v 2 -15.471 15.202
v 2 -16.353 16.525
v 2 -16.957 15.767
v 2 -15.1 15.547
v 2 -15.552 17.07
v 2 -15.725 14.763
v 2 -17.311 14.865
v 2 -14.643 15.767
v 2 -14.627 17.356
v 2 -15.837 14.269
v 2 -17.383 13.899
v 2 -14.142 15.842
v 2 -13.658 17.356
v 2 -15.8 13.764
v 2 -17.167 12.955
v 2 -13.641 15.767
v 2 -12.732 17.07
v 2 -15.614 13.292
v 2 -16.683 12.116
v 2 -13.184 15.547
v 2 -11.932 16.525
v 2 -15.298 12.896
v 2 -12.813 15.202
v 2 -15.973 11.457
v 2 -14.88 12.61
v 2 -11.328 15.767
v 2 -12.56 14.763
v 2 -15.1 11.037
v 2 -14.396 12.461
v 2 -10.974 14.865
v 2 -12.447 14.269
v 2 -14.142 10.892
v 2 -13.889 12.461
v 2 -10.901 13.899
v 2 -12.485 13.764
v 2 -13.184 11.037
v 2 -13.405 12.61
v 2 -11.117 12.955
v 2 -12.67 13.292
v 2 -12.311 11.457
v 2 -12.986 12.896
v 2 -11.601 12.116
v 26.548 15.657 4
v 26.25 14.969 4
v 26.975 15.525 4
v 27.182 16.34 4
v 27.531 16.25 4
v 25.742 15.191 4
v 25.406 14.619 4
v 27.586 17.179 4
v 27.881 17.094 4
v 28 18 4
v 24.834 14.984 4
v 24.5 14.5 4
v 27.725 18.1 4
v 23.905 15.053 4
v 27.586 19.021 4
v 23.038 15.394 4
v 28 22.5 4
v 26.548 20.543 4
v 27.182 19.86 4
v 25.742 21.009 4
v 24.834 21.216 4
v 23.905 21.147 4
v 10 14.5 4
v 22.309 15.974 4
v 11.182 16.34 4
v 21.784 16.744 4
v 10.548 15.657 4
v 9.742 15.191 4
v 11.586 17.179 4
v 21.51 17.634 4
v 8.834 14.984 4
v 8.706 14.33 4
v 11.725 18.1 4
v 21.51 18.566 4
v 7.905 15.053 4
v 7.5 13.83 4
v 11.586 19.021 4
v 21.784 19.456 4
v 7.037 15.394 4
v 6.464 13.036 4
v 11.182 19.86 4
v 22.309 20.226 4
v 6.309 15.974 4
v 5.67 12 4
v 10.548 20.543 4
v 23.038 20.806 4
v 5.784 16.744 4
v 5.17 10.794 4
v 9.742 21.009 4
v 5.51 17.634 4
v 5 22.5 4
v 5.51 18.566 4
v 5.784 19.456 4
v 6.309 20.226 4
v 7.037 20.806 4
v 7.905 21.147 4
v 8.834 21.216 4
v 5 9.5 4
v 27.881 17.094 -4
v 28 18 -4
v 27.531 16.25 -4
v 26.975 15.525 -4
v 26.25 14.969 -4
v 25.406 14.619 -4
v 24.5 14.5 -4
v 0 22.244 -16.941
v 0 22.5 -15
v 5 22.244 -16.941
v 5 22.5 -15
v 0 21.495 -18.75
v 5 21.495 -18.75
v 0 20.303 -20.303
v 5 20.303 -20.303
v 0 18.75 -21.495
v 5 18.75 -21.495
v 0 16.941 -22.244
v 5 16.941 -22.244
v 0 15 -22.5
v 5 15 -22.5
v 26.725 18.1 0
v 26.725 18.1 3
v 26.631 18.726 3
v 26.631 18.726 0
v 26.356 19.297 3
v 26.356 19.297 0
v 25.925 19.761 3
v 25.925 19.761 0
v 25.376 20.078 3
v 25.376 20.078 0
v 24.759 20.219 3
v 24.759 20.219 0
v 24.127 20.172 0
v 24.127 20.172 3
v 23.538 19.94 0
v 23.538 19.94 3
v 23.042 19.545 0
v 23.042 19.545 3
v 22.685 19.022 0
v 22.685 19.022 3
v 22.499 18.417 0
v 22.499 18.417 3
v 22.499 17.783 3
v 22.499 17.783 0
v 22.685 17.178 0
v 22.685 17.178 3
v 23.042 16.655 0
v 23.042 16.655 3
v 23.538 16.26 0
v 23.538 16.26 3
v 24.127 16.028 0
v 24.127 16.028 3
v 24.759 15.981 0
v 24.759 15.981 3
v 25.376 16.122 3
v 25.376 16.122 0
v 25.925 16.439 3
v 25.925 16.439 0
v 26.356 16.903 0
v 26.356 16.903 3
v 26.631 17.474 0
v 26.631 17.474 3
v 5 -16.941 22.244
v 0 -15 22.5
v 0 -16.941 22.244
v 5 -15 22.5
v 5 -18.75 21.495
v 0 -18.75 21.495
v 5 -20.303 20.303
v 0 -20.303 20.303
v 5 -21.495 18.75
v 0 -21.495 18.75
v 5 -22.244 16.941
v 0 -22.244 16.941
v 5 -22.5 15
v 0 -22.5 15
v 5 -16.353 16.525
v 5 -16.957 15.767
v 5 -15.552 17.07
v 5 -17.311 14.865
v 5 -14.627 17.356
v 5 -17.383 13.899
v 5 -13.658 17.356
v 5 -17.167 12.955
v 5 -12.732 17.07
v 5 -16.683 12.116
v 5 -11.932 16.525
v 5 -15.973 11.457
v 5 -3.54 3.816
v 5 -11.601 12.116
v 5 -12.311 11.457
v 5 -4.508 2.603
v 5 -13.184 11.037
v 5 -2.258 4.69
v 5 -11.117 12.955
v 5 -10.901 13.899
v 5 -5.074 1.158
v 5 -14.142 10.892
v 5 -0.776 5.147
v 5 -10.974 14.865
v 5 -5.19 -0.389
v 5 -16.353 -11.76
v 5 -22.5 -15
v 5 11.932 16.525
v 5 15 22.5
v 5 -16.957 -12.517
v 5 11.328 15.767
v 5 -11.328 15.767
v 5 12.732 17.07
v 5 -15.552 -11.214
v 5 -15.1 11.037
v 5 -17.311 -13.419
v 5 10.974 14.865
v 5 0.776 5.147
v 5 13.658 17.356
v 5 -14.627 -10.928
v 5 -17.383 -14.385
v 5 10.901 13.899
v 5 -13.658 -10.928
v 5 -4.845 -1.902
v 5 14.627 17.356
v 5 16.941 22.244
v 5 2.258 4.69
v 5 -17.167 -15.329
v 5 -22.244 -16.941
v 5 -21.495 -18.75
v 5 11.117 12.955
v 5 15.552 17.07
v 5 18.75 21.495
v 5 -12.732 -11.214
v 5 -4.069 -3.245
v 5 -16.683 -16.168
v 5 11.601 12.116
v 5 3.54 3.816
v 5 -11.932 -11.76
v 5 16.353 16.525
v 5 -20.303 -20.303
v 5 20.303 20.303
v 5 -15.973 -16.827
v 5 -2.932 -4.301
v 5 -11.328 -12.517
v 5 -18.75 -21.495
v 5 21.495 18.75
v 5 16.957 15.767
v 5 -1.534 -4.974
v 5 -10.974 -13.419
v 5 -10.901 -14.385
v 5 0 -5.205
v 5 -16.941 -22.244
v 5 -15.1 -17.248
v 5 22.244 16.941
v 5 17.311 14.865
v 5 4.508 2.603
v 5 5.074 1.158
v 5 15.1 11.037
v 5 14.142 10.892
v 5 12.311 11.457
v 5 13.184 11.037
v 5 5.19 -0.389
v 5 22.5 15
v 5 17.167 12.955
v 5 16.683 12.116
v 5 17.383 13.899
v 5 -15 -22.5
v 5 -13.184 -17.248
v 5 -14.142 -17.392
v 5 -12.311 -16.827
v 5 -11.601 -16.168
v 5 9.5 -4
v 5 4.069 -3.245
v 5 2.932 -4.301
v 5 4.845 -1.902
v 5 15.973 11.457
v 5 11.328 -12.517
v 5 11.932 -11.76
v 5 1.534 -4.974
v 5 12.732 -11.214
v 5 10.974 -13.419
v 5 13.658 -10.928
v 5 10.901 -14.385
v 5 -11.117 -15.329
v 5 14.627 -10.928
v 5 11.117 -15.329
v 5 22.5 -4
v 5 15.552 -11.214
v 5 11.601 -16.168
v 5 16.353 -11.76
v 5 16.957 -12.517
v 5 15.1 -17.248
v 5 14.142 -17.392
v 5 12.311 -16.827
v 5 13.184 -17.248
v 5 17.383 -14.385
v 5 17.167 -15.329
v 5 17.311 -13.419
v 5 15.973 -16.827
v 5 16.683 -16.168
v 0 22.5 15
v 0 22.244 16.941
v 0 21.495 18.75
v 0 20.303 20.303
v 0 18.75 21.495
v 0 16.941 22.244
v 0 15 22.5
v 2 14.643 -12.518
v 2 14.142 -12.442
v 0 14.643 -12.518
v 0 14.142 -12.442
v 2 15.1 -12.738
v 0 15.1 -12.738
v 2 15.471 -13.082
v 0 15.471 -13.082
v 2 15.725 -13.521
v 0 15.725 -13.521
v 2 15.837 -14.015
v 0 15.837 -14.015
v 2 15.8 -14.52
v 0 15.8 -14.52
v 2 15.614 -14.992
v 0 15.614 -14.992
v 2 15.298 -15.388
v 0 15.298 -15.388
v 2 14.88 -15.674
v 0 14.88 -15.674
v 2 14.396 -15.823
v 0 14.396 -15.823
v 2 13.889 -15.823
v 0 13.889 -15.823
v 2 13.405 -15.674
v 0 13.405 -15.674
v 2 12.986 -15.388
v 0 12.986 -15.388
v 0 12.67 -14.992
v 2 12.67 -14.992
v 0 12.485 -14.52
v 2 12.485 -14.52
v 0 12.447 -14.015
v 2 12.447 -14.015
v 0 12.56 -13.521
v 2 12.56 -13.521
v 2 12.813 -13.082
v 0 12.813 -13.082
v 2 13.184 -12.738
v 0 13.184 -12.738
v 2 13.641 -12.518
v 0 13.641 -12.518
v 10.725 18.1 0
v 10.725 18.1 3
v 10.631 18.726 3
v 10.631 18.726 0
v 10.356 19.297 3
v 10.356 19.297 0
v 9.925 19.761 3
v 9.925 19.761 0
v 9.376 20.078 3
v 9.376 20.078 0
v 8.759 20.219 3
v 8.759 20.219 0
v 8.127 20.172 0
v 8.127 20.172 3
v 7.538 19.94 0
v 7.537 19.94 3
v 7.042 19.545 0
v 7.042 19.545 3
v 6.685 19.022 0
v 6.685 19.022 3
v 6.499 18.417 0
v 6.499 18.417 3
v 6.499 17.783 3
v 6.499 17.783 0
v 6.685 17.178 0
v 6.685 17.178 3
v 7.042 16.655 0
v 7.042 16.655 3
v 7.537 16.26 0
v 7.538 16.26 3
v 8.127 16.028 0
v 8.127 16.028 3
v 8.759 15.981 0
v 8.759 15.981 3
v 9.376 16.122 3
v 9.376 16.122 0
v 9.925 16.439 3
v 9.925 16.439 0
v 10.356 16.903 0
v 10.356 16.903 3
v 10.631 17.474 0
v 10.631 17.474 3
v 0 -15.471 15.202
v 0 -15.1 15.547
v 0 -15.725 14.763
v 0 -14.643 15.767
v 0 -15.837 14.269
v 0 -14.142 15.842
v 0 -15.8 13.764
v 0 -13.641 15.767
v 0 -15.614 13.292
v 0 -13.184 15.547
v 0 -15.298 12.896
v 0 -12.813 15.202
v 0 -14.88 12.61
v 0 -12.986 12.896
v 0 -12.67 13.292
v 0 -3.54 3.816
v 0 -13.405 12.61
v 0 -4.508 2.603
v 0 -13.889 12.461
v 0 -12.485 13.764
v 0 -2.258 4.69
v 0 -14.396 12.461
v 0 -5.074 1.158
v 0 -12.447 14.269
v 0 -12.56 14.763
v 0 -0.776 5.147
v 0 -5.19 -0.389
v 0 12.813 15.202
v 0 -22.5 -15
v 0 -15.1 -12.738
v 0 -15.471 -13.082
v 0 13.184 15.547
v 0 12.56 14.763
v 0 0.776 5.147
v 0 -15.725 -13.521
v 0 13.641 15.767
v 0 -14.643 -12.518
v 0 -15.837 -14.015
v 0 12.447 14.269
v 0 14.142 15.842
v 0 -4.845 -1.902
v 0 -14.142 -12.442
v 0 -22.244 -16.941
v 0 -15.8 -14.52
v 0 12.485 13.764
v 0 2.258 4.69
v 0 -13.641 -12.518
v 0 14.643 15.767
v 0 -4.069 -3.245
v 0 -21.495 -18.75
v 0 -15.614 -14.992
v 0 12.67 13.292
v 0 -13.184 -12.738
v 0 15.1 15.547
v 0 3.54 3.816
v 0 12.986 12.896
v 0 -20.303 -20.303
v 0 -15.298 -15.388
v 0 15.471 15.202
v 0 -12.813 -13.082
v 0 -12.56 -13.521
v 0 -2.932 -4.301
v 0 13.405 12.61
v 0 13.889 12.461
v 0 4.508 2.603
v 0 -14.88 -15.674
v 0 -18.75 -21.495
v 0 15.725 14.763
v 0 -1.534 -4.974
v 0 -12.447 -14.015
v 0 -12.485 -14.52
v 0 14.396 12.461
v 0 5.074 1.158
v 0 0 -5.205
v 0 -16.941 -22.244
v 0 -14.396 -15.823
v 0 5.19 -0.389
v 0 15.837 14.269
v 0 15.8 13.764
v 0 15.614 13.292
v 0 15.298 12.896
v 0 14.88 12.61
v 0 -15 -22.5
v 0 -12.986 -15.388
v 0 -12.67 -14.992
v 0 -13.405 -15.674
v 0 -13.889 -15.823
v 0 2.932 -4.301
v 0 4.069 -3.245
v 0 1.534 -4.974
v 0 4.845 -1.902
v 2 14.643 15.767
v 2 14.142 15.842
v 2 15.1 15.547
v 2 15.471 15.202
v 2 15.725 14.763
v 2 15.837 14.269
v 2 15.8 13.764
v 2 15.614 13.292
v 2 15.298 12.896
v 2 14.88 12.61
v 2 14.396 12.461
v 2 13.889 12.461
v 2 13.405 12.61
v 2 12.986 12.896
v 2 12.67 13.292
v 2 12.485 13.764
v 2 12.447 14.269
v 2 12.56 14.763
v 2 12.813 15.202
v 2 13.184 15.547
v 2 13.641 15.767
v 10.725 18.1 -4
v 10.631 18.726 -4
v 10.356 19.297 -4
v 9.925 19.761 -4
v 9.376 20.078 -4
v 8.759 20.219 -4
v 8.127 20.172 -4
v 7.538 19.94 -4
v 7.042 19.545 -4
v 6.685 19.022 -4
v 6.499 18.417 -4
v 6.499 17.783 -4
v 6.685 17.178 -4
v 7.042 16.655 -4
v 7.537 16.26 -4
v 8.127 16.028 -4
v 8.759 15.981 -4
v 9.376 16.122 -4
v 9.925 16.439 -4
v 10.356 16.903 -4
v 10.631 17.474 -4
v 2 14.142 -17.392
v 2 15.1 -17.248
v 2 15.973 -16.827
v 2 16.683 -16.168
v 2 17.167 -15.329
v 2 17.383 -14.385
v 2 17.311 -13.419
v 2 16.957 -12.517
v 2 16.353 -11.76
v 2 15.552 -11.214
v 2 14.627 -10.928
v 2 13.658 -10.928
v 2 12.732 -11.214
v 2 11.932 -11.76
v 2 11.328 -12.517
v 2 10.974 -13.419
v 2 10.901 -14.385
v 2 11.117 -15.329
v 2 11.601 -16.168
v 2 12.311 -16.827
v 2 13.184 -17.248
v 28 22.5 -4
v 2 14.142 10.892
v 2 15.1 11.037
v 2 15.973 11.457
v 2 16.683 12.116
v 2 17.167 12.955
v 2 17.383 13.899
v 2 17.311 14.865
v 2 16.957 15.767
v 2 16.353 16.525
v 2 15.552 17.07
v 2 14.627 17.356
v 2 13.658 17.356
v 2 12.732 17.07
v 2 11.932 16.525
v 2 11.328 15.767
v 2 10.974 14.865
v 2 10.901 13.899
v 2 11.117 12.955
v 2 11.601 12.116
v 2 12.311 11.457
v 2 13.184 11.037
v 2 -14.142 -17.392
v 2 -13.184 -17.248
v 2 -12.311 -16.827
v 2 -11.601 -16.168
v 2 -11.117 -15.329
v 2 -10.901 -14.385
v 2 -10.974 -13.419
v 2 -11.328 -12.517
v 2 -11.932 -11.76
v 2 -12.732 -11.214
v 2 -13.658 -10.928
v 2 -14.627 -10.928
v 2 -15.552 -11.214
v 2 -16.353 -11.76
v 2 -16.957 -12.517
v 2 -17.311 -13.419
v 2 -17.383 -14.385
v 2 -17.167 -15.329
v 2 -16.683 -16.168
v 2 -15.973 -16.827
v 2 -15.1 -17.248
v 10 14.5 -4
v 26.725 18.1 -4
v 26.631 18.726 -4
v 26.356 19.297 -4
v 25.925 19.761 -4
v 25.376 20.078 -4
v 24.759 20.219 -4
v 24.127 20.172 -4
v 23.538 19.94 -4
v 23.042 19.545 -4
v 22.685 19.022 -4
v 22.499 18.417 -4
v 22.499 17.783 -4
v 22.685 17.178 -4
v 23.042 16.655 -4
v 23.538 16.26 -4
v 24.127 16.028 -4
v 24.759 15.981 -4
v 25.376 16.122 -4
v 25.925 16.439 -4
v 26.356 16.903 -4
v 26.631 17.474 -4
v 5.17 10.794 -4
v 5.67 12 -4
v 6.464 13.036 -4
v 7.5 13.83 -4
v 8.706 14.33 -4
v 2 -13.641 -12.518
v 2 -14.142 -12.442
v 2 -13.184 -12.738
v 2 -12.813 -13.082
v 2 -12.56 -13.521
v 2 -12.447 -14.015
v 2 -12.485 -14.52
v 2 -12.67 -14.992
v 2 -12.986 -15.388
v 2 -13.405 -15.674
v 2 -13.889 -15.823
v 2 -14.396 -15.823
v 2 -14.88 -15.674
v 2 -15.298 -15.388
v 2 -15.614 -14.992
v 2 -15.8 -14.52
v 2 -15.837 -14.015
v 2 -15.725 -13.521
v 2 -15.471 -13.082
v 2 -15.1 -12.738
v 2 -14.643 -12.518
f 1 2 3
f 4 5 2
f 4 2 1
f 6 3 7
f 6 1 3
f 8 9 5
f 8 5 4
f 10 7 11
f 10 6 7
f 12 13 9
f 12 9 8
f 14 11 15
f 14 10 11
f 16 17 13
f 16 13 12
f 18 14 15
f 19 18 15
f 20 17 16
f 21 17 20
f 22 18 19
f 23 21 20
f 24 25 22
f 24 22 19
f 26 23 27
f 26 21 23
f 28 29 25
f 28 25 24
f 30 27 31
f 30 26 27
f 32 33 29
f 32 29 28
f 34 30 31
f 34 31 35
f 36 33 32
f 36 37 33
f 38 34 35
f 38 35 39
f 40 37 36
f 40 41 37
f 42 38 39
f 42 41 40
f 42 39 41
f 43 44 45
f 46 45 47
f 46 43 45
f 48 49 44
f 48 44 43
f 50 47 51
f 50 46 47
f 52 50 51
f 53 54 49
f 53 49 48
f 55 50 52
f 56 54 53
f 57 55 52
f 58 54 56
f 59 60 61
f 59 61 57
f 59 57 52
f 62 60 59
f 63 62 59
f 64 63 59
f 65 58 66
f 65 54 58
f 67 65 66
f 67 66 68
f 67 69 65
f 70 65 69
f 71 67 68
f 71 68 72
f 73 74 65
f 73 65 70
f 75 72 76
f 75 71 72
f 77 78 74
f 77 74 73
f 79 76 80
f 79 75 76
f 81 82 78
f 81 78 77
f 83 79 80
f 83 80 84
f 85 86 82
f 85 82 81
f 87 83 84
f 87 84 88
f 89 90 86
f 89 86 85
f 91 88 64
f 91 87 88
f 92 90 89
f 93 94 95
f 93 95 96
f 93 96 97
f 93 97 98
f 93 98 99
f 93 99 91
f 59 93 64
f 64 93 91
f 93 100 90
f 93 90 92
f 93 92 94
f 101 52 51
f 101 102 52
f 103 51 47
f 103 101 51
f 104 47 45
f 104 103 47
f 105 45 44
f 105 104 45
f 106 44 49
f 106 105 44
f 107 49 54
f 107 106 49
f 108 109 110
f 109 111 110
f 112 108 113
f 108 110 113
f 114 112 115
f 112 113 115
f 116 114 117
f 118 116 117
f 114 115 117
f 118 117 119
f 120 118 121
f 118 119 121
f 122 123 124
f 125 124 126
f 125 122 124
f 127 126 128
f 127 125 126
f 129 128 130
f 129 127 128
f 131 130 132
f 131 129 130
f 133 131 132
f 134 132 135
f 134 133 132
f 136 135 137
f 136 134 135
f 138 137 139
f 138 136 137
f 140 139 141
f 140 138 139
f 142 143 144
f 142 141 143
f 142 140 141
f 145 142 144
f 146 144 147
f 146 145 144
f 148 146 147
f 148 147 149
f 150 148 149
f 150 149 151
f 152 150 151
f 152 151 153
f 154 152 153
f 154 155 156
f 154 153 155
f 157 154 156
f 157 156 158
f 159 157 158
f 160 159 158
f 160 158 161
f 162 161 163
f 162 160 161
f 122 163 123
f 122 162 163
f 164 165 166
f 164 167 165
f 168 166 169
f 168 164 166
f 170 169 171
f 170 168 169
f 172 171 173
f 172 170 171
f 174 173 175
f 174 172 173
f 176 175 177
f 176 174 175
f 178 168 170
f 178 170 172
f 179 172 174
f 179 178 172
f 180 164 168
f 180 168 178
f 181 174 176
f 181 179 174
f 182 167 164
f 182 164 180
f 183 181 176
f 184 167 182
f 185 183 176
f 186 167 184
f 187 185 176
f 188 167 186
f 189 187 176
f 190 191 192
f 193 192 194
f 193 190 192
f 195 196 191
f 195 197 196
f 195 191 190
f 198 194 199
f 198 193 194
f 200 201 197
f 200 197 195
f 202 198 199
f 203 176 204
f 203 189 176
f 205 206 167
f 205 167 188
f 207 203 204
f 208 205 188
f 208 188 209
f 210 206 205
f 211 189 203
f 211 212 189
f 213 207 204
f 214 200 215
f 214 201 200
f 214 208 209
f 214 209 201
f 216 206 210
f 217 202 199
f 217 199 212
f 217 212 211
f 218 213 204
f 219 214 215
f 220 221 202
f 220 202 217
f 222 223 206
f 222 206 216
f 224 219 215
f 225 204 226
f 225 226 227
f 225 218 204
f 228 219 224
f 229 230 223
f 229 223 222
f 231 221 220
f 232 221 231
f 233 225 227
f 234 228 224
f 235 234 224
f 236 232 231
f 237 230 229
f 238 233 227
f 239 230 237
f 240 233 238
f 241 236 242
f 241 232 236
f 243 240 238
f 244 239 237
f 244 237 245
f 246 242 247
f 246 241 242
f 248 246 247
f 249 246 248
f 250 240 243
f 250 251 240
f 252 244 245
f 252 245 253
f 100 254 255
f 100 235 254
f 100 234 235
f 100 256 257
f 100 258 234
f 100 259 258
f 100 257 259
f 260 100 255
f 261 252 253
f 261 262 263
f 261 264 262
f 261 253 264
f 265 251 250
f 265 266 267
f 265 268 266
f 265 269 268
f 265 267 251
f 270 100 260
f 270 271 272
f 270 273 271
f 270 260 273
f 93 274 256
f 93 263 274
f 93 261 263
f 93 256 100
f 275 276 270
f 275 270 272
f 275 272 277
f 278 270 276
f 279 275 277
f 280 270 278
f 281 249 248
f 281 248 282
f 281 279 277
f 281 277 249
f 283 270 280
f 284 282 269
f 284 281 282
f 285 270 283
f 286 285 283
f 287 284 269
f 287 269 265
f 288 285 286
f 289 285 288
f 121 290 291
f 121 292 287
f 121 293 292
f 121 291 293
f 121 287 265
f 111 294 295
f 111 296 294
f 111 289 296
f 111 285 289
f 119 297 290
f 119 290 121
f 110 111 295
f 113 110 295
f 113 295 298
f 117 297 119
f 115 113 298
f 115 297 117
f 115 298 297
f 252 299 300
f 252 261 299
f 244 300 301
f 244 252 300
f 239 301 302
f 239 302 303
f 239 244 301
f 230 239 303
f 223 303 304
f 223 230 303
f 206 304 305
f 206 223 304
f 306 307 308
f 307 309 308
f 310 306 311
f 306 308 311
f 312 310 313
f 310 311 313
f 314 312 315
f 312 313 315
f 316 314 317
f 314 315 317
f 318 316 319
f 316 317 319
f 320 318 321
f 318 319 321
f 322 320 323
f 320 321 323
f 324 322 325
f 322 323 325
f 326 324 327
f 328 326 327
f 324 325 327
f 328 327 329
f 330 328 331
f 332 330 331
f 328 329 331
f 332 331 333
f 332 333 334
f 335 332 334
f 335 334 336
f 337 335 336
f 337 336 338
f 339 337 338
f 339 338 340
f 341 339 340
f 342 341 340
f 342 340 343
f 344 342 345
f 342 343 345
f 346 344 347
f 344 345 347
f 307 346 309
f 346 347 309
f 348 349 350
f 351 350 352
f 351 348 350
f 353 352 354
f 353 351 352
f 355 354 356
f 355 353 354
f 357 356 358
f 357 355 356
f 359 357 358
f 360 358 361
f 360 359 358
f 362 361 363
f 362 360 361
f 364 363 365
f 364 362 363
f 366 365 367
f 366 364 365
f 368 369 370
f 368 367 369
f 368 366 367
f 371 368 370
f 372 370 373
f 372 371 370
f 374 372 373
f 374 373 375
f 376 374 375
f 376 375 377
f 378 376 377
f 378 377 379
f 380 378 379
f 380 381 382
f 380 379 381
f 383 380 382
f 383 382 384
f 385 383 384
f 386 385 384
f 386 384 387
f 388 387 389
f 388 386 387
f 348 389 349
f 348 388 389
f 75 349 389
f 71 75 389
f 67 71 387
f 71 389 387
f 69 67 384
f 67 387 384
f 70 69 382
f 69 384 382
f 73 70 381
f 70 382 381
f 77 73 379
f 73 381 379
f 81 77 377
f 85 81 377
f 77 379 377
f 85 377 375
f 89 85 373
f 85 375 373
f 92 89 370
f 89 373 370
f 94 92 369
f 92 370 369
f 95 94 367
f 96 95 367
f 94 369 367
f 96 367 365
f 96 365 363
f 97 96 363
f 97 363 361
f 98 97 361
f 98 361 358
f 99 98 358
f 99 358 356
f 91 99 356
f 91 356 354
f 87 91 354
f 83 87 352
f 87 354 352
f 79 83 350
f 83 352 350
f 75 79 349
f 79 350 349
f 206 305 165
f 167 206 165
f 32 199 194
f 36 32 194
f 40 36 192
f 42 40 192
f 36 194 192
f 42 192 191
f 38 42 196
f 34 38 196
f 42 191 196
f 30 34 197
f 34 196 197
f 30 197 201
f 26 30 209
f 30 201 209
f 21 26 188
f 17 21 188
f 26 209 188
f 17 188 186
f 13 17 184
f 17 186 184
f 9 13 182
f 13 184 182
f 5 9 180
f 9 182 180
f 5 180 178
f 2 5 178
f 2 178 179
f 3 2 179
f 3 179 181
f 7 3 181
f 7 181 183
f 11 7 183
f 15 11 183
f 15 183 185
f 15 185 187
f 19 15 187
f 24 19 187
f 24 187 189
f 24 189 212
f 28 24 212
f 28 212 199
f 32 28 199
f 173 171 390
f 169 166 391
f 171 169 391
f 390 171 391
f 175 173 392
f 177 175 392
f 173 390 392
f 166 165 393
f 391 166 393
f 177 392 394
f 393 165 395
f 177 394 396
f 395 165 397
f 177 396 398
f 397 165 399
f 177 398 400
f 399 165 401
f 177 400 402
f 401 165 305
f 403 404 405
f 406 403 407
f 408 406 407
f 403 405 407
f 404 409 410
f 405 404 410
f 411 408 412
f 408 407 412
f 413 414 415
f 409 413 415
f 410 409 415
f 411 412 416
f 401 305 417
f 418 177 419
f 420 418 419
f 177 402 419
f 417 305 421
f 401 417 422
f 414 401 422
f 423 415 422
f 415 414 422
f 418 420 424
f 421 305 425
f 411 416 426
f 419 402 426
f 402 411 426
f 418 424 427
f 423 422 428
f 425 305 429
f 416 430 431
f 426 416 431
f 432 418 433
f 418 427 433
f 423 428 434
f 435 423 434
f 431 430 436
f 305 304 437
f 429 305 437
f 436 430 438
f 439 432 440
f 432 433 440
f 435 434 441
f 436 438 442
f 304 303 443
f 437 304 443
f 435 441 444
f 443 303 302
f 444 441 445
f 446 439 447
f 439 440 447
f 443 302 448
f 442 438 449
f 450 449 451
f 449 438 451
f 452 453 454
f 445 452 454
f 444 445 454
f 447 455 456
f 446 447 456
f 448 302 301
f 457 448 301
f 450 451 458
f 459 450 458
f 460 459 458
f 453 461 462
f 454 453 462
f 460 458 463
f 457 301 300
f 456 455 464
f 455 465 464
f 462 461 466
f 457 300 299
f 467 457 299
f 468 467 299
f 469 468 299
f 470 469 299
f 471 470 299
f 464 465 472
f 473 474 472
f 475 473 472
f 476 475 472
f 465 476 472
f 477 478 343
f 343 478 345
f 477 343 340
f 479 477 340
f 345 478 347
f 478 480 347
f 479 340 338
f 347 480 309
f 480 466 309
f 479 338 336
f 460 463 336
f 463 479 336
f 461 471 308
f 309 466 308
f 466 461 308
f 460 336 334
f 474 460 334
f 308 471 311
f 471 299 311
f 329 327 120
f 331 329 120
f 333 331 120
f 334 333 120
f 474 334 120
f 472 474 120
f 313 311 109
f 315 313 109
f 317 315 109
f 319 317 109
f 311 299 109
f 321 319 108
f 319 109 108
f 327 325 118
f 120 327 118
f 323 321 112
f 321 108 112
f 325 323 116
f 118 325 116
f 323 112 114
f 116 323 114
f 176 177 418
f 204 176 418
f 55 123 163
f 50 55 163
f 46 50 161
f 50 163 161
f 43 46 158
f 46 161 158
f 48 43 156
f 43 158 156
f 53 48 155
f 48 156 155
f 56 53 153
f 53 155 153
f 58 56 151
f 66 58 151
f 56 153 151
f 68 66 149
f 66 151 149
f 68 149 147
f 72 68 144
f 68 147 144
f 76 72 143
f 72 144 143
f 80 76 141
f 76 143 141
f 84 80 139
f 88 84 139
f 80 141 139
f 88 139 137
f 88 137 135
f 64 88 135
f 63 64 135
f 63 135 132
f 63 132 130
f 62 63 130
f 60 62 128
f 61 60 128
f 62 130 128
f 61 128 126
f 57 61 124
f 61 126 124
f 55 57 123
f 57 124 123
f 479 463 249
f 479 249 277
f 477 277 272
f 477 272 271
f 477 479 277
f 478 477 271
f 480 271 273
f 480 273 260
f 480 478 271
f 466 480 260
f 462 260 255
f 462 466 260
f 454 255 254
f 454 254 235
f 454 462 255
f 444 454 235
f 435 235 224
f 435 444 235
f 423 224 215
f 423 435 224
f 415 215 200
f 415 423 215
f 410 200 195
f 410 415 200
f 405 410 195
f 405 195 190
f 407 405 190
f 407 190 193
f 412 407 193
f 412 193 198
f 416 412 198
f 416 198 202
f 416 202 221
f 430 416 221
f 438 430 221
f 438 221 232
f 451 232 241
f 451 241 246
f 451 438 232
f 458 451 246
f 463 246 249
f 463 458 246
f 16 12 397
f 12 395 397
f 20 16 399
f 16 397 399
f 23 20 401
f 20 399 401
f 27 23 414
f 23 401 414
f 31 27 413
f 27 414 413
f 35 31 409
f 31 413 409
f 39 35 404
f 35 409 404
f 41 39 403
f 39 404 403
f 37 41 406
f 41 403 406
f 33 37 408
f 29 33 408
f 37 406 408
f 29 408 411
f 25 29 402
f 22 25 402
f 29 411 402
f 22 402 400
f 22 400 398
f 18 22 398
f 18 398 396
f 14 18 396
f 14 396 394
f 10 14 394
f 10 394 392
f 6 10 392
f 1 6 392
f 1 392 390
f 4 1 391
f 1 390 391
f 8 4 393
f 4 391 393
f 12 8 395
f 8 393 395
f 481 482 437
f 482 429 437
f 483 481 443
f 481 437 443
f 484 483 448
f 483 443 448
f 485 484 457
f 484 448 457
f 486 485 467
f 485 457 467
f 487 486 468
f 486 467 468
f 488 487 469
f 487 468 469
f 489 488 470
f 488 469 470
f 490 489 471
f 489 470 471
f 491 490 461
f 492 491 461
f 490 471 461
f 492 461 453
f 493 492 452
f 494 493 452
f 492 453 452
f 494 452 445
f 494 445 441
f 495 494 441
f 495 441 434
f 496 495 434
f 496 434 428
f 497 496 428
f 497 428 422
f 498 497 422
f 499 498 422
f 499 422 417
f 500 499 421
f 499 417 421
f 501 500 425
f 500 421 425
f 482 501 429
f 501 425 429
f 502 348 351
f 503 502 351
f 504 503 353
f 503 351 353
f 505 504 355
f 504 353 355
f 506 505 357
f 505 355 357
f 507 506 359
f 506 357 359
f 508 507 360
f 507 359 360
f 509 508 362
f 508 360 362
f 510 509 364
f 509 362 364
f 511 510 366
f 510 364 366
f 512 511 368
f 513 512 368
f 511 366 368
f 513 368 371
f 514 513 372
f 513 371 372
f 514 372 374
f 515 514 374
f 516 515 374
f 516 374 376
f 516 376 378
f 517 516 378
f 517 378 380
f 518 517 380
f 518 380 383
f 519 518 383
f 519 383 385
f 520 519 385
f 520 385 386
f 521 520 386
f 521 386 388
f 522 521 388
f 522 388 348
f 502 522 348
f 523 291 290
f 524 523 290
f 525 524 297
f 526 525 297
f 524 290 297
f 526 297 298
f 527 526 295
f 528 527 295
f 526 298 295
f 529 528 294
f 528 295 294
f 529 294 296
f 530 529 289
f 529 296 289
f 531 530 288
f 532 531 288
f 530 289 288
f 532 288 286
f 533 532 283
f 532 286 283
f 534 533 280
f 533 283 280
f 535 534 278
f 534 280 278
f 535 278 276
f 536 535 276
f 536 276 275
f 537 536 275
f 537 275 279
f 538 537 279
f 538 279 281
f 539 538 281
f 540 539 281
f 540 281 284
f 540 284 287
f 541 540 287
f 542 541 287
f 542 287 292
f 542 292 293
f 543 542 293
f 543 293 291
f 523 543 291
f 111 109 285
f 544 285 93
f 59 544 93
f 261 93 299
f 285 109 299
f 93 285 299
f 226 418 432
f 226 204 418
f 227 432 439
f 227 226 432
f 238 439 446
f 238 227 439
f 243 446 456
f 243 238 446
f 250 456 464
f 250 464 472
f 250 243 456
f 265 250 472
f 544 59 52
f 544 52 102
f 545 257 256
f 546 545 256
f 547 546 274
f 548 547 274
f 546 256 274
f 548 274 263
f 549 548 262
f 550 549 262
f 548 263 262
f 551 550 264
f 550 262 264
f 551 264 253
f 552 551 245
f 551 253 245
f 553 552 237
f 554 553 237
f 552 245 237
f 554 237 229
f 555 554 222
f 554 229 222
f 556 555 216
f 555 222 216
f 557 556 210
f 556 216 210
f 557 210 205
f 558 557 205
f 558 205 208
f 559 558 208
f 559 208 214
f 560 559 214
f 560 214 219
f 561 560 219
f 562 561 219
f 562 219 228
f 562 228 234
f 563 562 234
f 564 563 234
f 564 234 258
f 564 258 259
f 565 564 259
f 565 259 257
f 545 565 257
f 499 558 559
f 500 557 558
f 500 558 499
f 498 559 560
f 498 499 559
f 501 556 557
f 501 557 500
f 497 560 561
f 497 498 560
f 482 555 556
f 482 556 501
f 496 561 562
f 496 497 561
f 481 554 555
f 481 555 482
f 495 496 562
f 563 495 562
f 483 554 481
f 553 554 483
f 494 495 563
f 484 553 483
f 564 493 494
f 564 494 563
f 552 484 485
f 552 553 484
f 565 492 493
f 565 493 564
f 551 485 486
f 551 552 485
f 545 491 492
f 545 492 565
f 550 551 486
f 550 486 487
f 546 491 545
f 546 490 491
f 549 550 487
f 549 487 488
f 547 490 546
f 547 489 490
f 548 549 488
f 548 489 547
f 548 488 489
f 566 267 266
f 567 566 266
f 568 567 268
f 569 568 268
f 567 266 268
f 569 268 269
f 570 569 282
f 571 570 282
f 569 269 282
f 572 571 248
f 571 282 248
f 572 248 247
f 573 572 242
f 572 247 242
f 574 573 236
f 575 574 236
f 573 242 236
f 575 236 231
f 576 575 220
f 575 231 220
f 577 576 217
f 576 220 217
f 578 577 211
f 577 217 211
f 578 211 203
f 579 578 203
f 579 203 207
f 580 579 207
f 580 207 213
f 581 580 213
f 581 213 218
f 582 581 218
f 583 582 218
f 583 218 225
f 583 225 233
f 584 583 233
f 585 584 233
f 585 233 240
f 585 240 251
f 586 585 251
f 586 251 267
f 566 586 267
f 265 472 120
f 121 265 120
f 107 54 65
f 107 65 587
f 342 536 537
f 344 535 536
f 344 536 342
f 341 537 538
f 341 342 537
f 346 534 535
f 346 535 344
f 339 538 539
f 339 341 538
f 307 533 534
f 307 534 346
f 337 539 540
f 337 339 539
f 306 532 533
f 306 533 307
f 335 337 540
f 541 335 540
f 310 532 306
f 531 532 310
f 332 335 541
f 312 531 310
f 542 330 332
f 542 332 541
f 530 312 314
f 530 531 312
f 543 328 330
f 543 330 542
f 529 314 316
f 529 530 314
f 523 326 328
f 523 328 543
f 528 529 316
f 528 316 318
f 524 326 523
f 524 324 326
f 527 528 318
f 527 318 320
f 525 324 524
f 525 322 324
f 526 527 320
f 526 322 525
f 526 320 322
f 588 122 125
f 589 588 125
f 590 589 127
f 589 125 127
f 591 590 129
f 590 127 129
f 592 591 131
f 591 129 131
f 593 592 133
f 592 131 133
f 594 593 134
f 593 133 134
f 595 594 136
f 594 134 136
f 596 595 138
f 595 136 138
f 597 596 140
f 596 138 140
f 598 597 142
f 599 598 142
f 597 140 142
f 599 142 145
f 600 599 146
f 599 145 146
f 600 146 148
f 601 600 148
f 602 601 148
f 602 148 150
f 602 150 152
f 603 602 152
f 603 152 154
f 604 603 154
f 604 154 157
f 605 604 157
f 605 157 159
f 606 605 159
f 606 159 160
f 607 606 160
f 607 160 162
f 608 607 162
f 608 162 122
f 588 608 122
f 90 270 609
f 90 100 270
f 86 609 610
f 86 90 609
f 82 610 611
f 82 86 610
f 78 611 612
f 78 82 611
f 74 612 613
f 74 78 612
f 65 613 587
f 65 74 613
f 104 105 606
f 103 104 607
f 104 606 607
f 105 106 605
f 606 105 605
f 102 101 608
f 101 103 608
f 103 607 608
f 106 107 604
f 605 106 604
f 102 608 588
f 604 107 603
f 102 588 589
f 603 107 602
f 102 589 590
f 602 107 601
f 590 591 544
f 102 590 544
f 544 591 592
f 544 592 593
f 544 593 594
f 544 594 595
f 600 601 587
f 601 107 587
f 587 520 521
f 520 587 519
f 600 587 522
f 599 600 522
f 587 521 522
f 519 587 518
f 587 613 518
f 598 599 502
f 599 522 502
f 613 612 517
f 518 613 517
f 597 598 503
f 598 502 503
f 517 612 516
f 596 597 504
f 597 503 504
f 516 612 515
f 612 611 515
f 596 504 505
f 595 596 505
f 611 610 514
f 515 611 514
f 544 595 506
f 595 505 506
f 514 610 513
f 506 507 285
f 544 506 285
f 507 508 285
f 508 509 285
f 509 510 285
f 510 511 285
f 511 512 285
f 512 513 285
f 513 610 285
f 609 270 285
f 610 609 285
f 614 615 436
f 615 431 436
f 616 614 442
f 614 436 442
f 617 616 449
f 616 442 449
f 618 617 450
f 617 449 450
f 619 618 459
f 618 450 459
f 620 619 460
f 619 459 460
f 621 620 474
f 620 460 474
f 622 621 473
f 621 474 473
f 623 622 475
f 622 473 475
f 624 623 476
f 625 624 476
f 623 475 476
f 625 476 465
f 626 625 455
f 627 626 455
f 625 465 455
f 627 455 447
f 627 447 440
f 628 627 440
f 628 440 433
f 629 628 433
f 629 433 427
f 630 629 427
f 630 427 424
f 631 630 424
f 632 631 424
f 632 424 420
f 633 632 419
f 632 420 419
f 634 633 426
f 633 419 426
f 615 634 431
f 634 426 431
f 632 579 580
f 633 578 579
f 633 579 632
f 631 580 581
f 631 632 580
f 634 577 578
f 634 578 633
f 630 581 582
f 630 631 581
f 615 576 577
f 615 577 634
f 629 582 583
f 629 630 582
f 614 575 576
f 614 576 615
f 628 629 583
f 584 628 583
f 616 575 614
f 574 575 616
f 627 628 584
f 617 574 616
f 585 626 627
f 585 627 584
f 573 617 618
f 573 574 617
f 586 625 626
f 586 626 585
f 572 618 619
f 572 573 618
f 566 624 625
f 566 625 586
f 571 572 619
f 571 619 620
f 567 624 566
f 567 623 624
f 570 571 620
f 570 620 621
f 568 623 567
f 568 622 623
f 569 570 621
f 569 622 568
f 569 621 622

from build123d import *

# Parameters (mm, degrees)
SKETCH1_R                      = 5.205
SKETCH1_W                      = 8
SKETCH1_H                      = 8
BOSS_EXTRUDE1_DEPTH            = 5
SKETCH1_3_W                    = 8
SKETCH1_3_H                    = 8
BOSS_EXTRUDE2_DEPTH            = 28
FILLET1_R                      = 7.5
FILLET2_R                      = 5
FILLET3_R                      = 3.5
SKETCH2_R                      = 2.125
CUT_EXTRUDE1_DEPTH             = 23.5
CUT_EXTRUDE1_DEPTH_BACK        = 23.5
CBORE_FOR_M3_SHCS1_D           = 3.4
CBORE_FOR_M3_SHCS1_CBORE_D     = 6.5
CBORE_FOR_M3_SHCS1_CBORE_DEPTH = 3
CHAMFER1_SIZE                  = 1


with BuildPart() as part:
    # Sketch1 → Boss-Extrude1 (new body)
    with BuildSketch(Plane(origin=(0, 0, 0), x_dir=(0, 0, -1), z_dir=(1, 0, 0))):
        Polygon((-22.5, 22.5), (-22.5, -22.5), (22.5, -22.5), (22.5, 22.5), (4, 22.5), (4, 14.5), (-4, 14.5), (-4, 22.5), align=None)
        Circle(SKETCH1_R, mode=Mode.SUBTRACT)
        with Locations((0, 18.5)):
            Rectangle(SKETCH1_W, SKETCH1_H)
    extrude(amount=BOSS_EXTRUDE1_DEPTH)

    # Sketch1<3> → Boss-Extrude2 (add)
    with BuildSketch(Plane(origin=(0, 0, 0), x_dir=(0, 0, -1), z_dir=(1, 0, 0))):
        with Locations((0, 18.5)):
            Rectangle(SKETCH1_3_W, SKETCH1_3_H)
    extrude(amount=BOSS_EXTRUDE2_DEPTH)

    # Fillet1
    fillet1_edges = [part.edges().sort_by_distance(p)[0] for p in [
        (2.5, 22.5, -22.5),
        (2.5, -22.5, -22.5),
        (2.5, -22.5, 22.5),
        (2.5, 22.5, 22.5),
    ]]
    fillet(fillet1_edges, radius=FILLET1_R)

    # Fillet2
    fillet2_edges = [part.edges().sort_by_distance(p)[0] for p in [
        (5, 14.5, 0),
    ]]
    fillet(fillet2_edges, radius=FILLET2_R)

    # Fillet3
    fillet3_edges = [part.edges().sort_by_distance(p)[0] for p in [
        (28, 14.5, 0),
    ]]
    fillet(fillet3_edges, radius=FILLET3_R)

    # Sketch2 → Cut-Extrude1 (cut, two sides)
    with BuildSketch(Plane.XY) as cut_extrude1_sk:
        with Locations((8.6, 18.1)):
            Circle(SKETCH2_R)
        with Locations((24.6, 18.1)):
            Circle(SKETCH2_R)
    extrude(amount=CUT_EXTRUDE1_DEPTH, mode=Mode.SUBTRACT)
    extrude(cut_extrude1_sk.sketch, amount=-CUT_EXTRUDE1_DEPTH_BACK, mode=Mode.SUBTRACT)

    # CBORE for M3 SHCS1 (through all)
    with Locations(Plane(origin=(5, 0, 0), x_dir=(0, 0, -1), z_dir=(1, 0, 0))):
        with Locations((-14.142135624, 14.142135624), (14.142135624, 14.142135624), (-14.142135624, -14.142135624), (14.142135624, -14.142135624)):
            CounterBoreHole(CBORE_FOR_M3_SHCS1_D / 2, CBORE_FOR_M3_SHCS1_CBORE_D / 2, CBORE_FOR_M3_SHCS1_CBORE_DEPTH)

    # Chamfer1
    chamfer1_edges = [part.edges().sort_by_distance(p)[0] for p in [
        (6.475, 18.1, 4),
        (22.475, 18.1, 4),
    ]]
    chamfer(chamfer1_edges, length=CHAMFER1_SIZE)


solid = part.part
